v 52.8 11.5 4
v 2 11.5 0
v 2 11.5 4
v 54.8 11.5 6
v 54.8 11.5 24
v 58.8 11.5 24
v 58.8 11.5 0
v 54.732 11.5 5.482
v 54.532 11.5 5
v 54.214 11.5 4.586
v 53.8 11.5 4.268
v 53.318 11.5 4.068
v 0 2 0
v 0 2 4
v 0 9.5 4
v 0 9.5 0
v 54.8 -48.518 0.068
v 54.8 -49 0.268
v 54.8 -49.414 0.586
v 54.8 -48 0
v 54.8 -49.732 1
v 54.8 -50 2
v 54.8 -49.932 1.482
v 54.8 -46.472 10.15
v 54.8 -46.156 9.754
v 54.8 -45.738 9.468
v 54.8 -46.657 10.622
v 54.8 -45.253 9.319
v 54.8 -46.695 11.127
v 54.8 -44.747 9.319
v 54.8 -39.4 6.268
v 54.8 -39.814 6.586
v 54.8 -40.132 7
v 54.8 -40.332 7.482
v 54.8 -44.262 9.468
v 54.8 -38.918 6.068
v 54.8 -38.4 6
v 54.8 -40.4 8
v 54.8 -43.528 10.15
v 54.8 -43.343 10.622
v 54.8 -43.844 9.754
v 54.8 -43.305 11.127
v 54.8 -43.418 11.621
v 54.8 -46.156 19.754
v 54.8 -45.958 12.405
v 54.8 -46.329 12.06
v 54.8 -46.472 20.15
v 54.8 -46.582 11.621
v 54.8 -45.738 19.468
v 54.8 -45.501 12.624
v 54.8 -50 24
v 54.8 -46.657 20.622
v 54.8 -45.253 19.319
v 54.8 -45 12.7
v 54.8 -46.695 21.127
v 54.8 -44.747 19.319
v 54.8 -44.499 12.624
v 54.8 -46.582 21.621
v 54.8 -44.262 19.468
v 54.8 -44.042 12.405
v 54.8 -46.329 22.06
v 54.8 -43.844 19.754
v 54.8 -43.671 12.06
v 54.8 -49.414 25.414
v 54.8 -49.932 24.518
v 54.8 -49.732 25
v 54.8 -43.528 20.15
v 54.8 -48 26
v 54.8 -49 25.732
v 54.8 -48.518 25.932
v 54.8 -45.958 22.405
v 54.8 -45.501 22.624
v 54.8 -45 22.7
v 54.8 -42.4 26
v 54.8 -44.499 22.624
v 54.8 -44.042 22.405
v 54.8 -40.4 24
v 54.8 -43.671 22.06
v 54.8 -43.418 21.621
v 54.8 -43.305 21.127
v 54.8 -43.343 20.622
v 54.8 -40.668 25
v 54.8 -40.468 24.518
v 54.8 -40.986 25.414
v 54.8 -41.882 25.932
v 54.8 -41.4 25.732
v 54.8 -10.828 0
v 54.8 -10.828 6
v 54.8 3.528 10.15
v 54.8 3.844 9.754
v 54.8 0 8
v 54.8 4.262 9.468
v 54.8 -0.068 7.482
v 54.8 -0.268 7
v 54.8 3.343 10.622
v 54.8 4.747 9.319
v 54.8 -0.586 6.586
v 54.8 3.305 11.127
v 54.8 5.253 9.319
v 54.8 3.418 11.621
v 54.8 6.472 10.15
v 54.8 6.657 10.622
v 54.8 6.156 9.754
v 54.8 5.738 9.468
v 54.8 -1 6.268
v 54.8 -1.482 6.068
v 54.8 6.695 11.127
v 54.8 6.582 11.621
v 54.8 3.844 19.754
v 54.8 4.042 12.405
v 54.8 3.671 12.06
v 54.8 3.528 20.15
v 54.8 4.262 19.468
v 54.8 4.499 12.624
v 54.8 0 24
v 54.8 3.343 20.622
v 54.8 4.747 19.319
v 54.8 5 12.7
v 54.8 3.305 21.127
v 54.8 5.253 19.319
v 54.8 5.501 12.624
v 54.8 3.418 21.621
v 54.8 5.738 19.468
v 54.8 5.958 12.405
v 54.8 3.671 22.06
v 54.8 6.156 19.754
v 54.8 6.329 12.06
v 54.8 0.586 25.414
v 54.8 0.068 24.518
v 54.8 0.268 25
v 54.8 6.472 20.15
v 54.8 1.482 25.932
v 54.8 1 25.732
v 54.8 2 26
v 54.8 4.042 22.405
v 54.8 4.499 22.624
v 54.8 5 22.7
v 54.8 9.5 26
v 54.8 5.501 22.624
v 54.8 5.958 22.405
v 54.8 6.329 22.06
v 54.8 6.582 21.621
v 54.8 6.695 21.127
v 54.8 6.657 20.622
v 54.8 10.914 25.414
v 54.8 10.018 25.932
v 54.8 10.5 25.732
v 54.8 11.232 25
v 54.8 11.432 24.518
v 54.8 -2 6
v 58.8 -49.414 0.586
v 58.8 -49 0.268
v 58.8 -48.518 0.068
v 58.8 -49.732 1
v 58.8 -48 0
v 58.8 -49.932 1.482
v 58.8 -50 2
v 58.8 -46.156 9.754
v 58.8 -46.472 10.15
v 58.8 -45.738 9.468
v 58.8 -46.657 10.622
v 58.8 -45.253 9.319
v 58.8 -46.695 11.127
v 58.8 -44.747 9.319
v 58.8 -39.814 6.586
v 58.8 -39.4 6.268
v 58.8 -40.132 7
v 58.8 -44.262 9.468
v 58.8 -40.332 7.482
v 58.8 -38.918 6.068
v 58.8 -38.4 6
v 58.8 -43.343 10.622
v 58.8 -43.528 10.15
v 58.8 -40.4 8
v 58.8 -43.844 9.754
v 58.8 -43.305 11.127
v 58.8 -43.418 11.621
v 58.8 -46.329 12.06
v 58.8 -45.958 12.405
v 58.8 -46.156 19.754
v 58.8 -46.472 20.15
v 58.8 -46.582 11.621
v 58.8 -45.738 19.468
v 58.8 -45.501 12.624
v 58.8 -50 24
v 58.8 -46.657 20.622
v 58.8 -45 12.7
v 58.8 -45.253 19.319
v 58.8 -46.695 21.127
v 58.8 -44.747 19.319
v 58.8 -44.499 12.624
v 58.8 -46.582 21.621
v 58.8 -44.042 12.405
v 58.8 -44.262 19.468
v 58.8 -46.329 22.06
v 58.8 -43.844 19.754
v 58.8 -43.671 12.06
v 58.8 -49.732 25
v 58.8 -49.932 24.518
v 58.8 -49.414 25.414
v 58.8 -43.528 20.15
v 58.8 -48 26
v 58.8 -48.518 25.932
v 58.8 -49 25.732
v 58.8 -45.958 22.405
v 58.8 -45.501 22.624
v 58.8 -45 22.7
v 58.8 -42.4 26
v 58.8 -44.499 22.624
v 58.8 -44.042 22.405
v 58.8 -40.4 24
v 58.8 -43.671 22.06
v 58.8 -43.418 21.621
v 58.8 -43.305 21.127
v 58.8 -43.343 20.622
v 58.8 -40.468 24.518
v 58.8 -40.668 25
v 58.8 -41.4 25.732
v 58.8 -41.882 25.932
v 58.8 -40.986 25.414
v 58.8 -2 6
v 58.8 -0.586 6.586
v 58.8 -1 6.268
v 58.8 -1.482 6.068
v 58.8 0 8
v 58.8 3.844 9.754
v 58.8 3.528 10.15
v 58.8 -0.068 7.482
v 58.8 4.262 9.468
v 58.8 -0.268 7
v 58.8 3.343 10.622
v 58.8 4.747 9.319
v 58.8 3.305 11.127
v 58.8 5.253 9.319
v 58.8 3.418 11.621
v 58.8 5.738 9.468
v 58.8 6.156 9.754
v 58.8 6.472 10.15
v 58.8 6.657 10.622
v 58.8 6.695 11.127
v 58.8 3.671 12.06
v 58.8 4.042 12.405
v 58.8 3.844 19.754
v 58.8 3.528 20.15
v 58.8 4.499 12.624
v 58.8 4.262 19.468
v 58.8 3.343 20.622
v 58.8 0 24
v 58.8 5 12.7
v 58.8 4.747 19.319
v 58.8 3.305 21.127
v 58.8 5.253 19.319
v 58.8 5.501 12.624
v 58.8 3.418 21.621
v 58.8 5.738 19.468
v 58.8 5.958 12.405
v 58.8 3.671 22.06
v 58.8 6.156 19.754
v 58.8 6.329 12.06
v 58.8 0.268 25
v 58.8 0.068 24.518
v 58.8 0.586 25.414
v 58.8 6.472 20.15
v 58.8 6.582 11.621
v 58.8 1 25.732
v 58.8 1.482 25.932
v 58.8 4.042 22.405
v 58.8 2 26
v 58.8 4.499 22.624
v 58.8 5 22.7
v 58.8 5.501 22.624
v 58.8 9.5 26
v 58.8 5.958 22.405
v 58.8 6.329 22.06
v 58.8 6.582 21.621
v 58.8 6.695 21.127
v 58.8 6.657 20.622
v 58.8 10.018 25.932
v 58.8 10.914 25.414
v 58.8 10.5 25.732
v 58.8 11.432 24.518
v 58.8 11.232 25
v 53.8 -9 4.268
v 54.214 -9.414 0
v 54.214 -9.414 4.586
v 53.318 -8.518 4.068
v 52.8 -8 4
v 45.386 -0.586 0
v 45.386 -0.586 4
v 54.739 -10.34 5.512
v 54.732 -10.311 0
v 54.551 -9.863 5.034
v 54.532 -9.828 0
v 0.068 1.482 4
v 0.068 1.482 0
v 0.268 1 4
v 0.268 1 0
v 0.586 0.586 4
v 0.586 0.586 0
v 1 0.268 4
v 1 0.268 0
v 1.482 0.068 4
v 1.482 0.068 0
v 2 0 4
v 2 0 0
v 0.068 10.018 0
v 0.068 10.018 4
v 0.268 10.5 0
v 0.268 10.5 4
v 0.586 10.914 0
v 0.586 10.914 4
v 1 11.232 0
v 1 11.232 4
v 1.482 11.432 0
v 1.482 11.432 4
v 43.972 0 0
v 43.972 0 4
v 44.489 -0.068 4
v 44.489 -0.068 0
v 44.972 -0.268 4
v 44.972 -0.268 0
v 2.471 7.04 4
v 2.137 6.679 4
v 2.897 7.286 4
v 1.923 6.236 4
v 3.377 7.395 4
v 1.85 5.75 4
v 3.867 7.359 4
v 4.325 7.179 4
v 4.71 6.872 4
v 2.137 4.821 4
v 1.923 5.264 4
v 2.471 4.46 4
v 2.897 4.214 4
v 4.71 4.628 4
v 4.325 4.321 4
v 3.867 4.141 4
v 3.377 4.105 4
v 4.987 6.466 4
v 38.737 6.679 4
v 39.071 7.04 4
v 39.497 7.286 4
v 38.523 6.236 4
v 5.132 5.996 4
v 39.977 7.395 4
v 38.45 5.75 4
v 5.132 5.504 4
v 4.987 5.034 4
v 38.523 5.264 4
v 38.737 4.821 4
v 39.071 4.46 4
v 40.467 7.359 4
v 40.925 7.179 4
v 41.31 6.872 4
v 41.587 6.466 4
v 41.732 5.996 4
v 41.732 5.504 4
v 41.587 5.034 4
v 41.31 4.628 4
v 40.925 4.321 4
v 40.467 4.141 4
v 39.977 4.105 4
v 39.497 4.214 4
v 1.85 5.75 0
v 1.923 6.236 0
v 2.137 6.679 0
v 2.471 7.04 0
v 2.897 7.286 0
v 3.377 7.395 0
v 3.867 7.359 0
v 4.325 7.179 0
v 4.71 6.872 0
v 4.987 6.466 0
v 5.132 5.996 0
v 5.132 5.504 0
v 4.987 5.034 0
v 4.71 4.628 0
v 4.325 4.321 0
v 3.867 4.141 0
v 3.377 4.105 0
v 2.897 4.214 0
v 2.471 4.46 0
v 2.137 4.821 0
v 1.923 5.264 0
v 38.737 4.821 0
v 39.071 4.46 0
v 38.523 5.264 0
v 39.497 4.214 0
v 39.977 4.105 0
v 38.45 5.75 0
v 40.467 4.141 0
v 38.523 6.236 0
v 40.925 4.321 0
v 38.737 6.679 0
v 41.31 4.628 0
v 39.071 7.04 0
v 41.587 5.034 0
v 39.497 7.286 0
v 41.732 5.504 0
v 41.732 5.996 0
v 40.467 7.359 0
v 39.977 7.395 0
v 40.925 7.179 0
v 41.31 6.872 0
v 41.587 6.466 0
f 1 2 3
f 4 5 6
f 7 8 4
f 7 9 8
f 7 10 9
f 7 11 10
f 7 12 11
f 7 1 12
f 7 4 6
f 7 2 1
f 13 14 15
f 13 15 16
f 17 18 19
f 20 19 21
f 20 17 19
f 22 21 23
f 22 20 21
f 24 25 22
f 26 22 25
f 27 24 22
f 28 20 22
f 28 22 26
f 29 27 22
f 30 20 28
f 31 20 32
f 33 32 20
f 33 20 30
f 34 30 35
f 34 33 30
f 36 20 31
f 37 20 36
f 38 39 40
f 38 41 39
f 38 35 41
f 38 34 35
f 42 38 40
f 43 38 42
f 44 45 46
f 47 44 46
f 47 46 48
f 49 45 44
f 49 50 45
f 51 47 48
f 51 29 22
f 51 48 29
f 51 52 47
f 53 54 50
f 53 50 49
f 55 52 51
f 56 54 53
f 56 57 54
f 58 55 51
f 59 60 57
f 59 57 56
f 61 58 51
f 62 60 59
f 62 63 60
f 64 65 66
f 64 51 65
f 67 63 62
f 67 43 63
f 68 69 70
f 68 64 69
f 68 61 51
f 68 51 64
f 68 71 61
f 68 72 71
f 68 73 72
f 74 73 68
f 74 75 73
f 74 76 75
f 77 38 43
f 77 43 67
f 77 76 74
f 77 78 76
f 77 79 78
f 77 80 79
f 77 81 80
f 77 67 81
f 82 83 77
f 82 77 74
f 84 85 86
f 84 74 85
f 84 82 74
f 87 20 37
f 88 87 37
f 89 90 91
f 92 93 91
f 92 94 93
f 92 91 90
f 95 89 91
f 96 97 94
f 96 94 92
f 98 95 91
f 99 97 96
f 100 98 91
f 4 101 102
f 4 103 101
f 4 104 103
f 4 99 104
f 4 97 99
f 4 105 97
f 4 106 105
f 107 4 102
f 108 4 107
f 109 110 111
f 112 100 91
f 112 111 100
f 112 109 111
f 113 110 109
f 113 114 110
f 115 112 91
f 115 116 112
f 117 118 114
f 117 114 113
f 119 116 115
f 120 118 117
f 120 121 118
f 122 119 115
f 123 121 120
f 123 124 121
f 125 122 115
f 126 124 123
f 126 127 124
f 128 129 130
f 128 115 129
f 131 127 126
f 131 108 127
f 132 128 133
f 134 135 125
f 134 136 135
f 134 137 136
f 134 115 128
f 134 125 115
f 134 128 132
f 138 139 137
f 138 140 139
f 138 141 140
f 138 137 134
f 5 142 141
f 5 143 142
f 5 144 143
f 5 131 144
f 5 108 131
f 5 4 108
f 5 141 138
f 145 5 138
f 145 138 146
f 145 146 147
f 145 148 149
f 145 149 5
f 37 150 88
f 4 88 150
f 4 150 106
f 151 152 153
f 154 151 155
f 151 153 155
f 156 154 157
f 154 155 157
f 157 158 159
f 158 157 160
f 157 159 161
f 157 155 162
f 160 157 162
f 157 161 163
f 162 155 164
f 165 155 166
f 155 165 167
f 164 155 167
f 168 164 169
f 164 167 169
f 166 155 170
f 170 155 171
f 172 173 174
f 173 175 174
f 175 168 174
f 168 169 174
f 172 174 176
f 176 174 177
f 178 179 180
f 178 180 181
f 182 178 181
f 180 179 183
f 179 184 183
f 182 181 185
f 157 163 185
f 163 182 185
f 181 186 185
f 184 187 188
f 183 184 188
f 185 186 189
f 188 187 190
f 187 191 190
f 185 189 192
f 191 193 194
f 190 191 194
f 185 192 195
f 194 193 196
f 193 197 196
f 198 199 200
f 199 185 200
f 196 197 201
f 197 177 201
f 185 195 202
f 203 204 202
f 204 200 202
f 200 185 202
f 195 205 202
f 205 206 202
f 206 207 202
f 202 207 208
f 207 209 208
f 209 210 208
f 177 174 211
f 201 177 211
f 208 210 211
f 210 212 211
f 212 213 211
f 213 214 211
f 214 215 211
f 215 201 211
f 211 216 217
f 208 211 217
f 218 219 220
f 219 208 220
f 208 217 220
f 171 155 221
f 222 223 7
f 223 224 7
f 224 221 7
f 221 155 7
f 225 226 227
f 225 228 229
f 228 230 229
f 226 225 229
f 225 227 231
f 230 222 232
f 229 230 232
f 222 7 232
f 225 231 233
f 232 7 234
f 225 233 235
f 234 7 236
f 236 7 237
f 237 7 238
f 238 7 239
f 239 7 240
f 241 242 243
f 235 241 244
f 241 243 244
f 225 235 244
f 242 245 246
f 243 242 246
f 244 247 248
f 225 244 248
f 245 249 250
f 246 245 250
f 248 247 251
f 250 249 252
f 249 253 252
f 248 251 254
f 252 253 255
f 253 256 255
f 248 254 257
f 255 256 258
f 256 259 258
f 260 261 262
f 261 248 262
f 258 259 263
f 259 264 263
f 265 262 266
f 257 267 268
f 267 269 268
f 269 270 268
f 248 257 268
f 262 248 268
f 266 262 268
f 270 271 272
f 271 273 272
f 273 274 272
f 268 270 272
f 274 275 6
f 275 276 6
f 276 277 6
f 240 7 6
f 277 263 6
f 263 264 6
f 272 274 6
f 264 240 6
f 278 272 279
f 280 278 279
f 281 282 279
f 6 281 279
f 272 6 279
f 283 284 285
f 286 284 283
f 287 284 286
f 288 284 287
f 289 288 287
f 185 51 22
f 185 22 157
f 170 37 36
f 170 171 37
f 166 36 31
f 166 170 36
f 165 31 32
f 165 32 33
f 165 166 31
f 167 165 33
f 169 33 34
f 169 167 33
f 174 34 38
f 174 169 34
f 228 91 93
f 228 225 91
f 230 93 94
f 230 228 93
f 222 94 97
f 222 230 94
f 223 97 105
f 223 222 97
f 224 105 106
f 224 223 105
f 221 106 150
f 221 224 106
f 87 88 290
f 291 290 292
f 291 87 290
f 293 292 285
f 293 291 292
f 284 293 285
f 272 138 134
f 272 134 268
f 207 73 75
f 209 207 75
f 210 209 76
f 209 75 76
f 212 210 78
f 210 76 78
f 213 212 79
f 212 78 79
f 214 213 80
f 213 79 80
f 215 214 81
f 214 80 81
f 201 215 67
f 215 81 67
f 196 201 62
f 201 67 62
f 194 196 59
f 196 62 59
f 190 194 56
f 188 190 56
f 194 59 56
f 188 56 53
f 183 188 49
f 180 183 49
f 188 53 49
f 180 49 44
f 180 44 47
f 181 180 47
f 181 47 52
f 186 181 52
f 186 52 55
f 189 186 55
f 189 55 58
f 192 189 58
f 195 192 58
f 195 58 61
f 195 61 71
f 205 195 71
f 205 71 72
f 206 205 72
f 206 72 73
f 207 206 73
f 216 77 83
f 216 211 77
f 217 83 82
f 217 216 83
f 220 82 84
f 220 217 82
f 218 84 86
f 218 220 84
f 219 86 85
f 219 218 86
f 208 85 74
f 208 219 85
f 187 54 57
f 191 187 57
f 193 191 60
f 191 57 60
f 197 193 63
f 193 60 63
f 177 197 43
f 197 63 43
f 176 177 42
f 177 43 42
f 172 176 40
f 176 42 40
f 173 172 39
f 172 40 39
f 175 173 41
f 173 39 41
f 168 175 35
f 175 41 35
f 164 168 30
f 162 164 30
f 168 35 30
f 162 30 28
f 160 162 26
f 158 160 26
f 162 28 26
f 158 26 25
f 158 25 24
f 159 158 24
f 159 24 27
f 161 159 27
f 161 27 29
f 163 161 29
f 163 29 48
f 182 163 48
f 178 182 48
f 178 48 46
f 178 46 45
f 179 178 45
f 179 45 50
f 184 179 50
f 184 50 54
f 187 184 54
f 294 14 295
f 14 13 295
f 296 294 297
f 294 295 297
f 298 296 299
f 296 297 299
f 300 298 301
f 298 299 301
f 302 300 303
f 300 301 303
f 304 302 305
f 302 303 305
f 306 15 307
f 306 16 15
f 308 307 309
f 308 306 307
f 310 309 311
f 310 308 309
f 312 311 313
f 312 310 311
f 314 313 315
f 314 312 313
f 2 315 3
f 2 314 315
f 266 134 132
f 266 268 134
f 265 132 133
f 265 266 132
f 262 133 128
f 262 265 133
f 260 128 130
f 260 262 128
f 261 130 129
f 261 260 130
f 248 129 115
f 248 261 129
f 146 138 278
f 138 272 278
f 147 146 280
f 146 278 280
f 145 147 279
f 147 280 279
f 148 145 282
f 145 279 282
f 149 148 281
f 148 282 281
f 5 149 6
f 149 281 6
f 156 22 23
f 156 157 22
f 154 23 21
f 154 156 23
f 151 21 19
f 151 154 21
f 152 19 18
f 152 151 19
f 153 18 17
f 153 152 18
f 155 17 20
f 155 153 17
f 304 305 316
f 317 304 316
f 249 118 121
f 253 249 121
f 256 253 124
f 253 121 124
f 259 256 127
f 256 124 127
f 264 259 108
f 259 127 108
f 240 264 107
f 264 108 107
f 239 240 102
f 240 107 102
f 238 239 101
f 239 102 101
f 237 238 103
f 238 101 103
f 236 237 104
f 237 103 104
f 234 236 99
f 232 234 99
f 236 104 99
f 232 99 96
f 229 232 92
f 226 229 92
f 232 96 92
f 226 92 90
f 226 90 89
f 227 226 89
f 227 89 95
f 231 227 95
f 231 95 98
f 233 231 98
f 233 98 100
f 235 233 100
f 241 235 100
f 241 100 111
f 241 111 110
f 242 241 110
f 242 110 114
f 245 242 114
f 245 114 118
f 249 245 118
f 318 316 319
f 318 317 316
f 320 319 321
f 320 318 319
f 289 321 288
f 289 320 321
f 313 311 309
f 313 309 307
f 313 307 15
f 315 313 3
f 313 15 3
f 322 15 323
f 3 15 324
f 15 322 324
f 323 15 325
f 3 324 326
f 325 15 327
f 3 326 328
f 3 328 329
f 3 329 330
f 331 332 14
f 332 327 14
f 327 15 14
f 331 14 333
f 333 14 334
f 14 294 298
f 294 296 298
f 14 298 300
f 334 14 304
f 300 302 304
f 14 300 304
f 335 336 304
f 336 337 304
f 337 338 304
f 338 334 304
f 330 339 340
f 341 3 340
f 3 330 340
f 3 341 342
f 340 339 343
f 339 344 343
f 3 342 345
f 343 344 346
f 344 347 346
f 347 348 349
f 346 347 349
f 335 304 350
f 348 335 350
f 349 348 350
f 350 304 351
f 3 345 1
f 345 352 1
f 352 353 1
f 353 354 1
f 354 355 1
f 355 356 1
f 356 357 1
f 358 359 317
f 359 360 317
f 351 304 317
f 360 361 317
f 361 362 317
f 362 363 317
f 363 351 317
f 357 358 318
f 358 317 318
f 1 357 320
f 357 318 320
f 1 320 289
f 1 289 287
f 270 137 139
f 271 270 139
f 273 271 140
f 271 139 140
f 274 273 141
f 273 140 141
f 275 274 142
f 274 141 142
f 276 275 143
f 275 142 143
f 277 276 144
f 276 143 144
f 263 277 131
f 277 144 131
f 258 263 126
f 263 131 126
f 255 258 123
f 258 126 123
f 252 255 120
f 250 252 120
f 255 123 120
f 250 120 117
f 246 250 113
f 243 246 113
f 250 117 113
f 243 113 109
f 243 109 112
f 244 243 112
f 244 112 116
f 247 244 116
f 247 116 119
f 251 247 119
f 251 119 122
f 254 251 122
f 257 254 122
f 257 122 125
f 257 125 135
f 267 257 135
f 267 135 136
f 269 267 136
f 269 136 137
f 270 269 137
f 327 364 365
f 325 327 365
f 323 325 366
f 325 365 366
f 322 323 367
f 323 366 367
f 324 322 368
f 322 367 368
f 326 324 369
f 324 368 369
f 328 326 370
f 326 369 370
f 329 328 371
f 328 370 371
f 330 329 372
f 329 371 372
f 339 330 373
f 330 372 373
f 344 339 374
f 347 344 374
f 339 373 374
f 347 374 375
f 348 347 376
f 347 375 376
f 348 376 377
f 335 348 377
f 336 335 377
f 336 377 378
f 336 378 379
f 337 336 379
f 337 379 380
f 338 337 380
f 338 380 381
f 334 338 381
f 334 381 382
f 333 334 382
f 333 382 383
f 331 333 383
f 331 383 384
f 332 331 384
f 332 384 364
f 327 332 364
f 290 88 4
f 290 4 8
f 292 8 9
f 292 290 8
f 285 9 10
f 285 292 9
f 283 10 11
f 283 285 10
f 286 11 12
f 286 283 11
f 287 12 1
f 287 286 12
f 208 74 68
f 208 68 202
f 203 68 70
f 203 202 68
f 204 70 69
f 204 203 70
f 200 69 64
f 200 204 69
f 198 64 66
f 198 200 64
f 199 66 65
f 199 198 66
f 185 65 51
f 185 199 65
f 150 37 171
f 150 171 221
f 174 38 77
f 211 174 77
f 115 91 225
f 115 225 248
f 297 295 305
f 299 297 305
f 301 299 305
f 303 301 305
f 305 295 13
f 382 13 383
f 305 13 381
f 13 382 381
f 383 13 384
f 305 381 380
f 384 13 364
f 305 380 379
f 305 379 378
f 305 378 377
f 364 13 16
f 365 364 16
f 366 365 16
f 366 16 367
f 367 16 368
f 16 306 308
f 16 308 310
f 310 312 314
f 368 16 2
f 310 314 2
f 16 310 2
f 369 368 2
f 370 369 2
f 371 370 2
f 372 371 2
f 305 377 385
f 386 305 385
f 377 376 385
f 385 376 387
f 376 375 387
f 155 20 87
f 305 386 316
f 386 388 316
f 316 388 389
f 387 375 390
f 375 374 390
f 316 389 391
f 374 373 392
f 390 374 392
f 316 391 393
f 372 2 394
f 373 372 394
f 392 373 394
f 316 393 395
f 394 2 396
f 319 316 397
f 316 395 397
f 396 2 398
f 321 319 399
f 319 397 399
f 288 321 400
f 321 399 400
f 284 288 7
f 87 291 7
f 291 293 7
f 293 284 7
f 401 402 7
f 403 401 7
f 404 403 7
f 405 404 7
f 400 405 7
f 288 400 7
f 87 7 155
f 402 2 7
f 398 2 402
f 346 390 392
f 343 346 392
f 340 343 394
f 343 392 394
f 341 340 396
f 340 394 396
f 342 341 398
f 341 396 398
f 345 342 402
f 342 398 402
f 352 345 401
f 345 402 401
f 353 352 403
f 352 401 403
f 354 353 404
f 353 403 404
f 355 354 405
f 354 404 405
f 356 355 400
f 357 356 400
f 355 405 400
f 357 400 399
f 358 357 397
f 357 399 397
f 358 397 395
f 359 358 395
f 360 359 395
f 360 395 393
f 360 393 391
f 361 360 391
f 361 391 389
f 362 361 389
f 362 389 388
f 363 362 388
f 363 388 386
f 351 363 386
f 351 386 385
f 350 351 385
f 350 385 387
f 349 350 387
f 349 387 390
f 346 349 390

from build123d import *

# Parameters (mm, degrees)
SKETCH1_W           = 58.8
SKETCH1_H           = 4
SKETCH1_W_2         = 4
SKETCH1_H_2         = 22
BOSS_EXTRUDE1_DEPTH = 11.5
CUT_EXTRUDE1_REACH  = 67.312
SKETCH2_R           = 1.65
SKETCH3_W           = 4
SKETCH3_H           = 26
BOSS_EXTRUDE2_DEPTH = 50
CUT_EXTRUDE2_REACH  = 80.607
SKETCH4_R           = 1.7
SKETCH4_W           = 20
SKETCH4_H           = 40.4
CHAMFER1_SIZE       = 10
FILLET1_R           = 2
FILLET2_R           = 2
FILLET3_R           = 2
FILLET4_R           = 2


with BuildPart() as part:
    # Sketch1 → Boss-Extrude1 (new body)
    with BuildSketch(Plane(origin=(0, 0, 0), x_dir=(1, 0, 0), z_dir=(0, 1, 0))):
        with Locations((29.4, -2)):
            Rectangle(SKETCH1_W, SKETCH1_H)
        with Locations((56.8, -15)):
            Rectangle(SKETCH1_W_2, SKETCH1_H_2)
    extrude(amount=BOSS_EXTRUDE1_DEPTH)

    # Sketch2 → Cut-Extrude1 (cut, up to next)
    with BuildSketch(Plane(origin=(0, 0, 0), x_dir=(-1, 0, 0), z_dir=(0, 0, -1)), mode=Mode.PRIVATE) as cut_extrude1_sk1:
        with Locations((-3.5, 5.75)):
            Circle(SKETCH2_R)
    cut_extrude1_tool1 = extrude(cut_extrude1_sk1.sketch, amount=-CUT_EXTRUDE1_REACH, mode=Mode.PRIVATE) & part.part
    # Sketch2 → Cut-Extrude1 (cut, up to next)
    with BuildSketch(Plane(origin=(0, 0, 0), x_dir=(-1, 0, 0), z_dir=(0, 0, -1)), mode=Mode.PRIVATE) as cut_extrude1_sk2:
        with Locations((-40.1, 5.75)):
            Circle(SKETCH2_R)
    cut_extrude1_tool2 = extrude(cut_extrude1_sk2.sketch, amount=-CUT_EXTRUDE1_REACH, mode=Mode.PRIVATE) & part.part
    add(cut_extrude1_tool1.solids().sort_by_distance((3.5, 5.75, 0))[0], mode=Mode.SUBTRACT)
    add(cut_extrude1_tool2.solids().sort_by_distance((40.1, 5.75, 0))[0], mode=Mode.SUBTRACT)

    # Sketch3 → Boss-Extrude2 (add)
    with BuildSketch(Plane.XZ):
        with Locations((56.8, 13)):
            Rectangle(SKETCH3_W, SKETCH3_H)
    extrude(amount=BOSS_EXTRUDE2_DEPTH)

    # Sketch4 → Cut-Extrude2 (cut, up to next)
    with BuildSketch(Plane.ZY.offset(-54.8), mode=Mode.PRIVATE) as cut_extrude2_sk1:
        with Locations((11, 5)):
            Circle(SKETCH4_R)
    cut_extrude2_tool1 = extrude(cut_extrude2_sk1.sketch, amount=-CUT_EXTRUDE2_REACH, mode=Mode.PRIVATE) & part.part
    # Sketch4 → Cut-Extrude2 (cut, up to next)
    with BuildSketch(Plane.ZY.offset(-54.8), mode=Mode.PRIVATE) as cut_extrude2_sk2:
        with Locations((21, 5)):
            Circle(SKETCH4_R)
    cut_extrude2_tool2 = extrude(cut_extrude2_sk2.sketch, amount=-CUT_EXTRUDE2_REACH, mode=Mode.PRIVATE) & part.part
    # Sketch4 → Cut-Extrude2 (cut, up to next)
    with BuildSketch(Plane.ZY.offset(-54.8), mode=Mode.PRIVATE) as cut_extrude2_sk3:
        with Locations((21, -45)):
            Circle(SKETCH4_R)
    cut_extrude2_tool3 = extrude(cut_extrude2_sk3.sketch, amount=-CUT_EXTRUDE2_REACH, mode=Mode.PRIVATE) & part.part
    # Sketch4 → Cut-Extrude2 (cut, up to next)
    with BuildSketch(Plane.ZY.offset(-54.8), mode=Mode.PRIVATE) as cut_extrude2_sk4:
        with Locations((11, -45)):
            Circle(SKETCH4_R)
    cut_extrude2_tool4 = extrude(cut_extrude2_sk4.sketch, amount=-CUT_EXTRUDE2_REACH, mode=Mode.PRIVATE) & part.part
    # Sketch4 → Cut-Extrude2 (cut, up to next)
    with BuildSketch(Plane.ZY.offset(-54.8), mode=Mode.PRIVATE) as cut_extrude2_sk5:
        with Locations((16, -20.2)):
            Rectangle(SKETCH4_W, SKETCH4_H)
    cut_extrude2_tool5 = extrude(cut_extrude2_sk5.sketch, amount=-CUT_EXTRUDE2_REACH, mode=Mode.PRIVATE) & part.part
    add(cut_extrude2_tool1.solids().sort_by_distance((54.8, 5, 11))[0], mode=Mode.SUBTRACT)
    add(cut_extrude2_tool2.solids().sort_by_distance((54.8, 5, 21))[0], mode=Mode.SUBTRACT)
    add(cut_extrude2_tool3.solids().sort_by_distance((54.8, -45, 21))[0], mode=Mode.SUBTRACT)
    add(cut_extrude2_tool4.solids().sort_by_distance((54.8, -45, 11))[0], mode=Mode.SUBTRACT)
    add(cut_extrude2_tool5.solids().sort_by_distance((54.8, -20.2, 16))[0], mode=Mode.SUBTRACT)

    # Chamfer1
    chamfer1_edges = [part.edges().sort_by_distance(p)[0] for p in [
        (54.8, 0, 2),
    ]]
    chamfer(chamfer1_edges, length=CHAMFER1_SIZE)

    # Fillet1
    fillet1_edges = [part.edges().sort_by_distance(p)[0] for p in [
        (54.8, 0.75, 4),
    ]]
    fillet(fillet1_edges, radius=FILLET1_R - 0.0001)  # a hair under: the kernel refuses the full size

    # Fillet2
    fillet2_edges = [part.edges().sort_by_distance(p)[0] for p in [
        (56.8, -50, 26),
        (56.8, -40.4, 26),
        (56.8, 0, 26),
        (56.8, 11.5, 26),
        (54.8, -10, 2.99995),
        (44.8, 0, 2),
        (0, 11.5, 2),
        (0, 0, 2),
    ]]
    fillet(fillet2_edges, radius=FILLET2_R)

    # Fillet3
    fillet3_edges = [part.edges().sort_by_distance(p)[0] for p in [
        (56.8, -40.4, 6),
        (56.8, 0, 6),
    ]]
    fillet(fillet3_edges, radius=FILLET3_R)

    # Fillet4
    fillet4_edges = [part.edges().sort_by_distance(p)[0] for p in [
        (56.8, -50, 0),
    ]]
    fillet(fillet4_edges, radius=FILLET4_R)


solid = part.part
